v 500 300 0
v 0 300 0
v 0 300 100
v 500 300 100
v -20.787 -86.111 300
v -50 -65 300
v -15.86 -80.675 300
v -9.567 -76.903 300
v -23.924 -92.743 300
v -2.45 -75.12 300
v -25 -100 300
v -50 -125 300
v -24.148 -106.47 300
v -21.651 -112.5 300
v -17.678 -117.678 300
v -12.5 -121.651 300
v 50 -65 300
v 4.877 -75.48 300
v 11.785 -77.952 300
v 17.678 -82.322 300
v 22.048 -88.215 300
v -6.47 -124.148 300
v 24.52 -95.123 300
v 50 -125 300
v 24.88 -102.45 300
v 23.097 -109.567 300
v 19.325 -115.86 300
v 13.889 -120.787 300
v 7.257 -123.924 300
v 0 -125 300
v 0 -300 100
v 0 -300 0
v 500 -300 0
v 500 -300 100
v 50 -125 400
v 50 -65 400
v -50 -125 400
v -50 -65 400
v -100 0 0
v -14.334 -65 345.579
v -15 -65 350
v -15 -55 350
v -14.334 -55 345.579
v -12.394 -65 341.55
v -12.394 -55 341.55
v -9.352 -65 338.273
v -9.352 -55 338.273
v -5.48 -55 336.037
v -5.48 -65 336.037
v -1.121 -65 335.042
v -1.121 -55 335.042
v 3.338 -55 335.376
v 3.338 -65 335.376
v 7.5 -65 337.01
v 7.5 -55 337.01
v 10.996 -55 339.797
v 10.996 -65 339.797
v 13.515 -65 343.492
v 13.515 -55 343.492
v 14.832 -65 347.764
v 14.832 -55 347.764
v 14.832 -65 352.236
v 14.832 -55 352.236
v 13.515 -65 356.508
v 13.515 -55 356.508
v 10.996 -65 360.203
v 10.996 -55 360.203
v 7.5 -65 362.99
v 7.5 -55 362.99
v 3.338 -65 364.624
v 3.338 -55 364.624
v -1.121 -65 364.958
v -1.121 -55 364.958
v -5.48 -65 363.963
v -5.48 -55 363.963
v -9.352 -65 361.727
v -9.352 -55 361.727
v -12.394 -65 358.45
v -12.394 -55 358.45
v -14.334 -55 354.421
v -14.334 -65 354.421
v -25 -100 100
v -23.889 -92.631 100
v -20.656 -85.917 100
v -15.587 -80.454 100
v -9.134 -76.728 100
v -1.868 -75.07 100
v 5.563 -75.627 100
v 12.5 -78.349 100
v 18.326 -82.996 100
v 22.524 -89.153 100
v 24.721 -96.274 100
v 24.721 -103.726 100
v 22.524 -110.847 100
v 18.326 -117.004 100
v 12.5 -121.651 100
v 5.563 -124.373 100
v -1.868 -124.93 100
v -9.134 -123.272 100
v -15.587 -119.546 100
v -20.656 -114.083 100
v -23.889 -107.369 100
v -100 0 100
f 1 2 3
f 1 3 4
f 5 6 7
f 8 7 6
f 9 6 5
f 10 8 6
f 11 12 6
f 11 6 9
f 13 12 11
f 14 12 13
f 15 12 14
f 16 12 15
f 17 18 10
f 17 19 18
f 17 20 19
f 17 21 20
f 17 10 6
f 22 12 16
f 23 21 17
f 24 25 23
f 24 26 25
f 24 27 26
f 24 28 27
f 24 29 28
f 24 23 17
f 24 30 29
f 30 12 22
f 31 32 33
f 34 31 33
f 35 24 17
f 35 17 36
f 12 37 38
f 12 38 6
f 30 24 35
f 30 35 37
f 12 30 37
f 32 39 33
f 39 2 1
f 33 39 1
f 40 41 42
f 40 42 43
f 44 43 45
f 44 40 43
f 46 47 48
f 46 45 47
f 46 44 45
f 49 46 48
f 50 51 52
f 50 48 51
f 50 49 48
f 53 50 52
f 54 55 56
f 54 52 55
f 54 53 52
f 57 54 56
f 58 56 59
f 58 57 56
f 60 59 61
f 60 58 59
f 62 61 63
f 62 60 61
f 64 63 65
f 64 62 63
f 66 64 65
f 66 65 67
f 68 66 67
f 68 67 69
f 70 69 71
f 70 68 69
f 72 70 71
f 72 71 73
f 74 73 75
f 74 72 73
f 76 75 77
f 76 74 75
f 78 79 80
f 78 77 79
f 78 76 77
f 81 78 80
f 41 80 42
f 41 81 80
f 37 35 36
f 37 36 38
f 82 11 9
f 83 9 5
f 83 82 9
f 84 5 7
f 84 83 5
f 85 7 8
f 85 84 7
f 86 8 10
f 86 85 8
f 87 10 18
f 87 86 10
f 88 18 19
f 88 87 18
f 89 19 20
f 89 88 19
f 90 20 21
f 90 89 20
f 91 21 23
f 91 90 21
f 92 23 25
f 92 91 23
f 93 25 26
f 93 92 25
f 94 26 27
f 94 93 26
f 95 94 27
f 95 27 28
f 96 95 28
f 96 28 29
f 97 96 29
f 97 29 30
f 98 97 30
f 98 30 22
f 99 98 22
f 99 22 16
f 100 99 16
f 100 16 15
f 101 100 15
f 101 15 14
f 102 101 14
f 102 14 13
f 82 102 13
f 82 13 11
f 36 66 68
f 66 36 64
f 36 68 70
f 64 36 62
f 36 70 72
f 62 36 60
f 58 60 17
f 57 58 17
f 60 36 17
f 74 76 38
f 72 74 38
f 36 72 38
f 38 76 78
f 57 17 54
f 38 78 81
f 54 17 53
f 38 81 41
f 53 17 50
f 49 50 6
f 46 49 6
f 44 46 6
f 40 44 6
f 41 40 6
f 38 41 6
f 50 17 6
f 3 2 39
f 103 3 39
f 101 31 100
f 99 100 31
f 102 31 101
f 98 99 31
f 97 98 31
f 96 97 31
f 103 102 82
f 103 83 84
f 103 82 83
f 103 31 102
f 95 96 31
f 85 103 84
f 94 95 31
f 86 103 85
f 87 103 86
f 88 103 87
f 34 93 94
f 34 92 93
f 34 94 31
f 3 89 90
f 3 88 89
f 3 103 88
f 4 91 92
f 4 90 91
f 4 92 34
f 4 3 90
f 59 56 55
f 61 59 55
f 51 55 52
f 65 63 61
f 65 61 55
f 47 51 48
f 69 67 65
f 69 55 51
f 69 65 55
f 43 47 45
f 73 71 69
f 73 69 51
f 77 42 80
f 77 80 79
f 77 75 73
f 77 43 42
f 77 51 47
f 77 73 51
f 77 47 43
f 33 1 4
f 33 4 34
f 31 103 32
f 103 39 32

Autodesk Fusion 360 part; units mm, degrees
sketch "Sketch1" plane through (0, 0, 0) normal (0, 0, 1) x (1, 0, 0)
  line L0 (0, 300) -> (500, 300)
  line L1 (0, -300) -> (500, -300)
  line L2 (0, 300) -> (-100, 0)
  line L3 (-100, 0) -> (0, -300)
  line L4 (500, 300) -> (500, -300)
  dimension "d1" = 500
extrude "Extrude1" add sketch "Sketch1" along normal blind 100
sketch "Sketch2" plane through (0, 0, 100) normal (0, 0, 1) x (-1, 0, 0)
  line L0 (0, -300) -> (100, 0)
  line L1 (100, 0) -> (0, 300)
  line L2 (0, 300) -> (-500, 300)
  line L3 (-500, 300) -> (-500, -300)
  line L4 (-500, -300) -> (0, -300)
  circle A0 centre (0, 100) radius 25
  circle A1 centre (0, -100) radius 25
  dimension "d7" = 50
  dimension "d8" = 50
extrude "Extrude2" add sketch "Sketch2" along normal blind 265 contours A0
ref_plane "WorkPlane1" through (0, -125, 274.5445) normal (0, -1, 0) x (-1, 0, 0)
sketch "Sketch3" plane through (0, -125, 0) normal (0, -1, 0) x (-1, 0, 0)
  line L0 (50, -300) -> (-50, -300)
  line L1 (-50, -300) -> (-50, -400)
  line L2 (-50, -400) -> (50, -400)
  line L3 (50, -400) -> (50, -300)
extrude "Extrude3" add sketch "Sketch3" against normal blind 60
sketch "Sketch4" plane through (0, -65, 0) normal (0, 1, 0) x (-1, 0, 0)
  line L0 (50, 300) -> (50, 400)
  line L1 (50, 400) -> (-50, 400)
  line L2 (-50, 400) -> (-50, 300)
  line L3 (-50, 300) -> (50, 300)
  circle A0 centre (0, 350) radius 15
  dimension "d14" = 30
extrude "Extrude4" add sketch "Sketch4" along normal blind 10 contours A0
